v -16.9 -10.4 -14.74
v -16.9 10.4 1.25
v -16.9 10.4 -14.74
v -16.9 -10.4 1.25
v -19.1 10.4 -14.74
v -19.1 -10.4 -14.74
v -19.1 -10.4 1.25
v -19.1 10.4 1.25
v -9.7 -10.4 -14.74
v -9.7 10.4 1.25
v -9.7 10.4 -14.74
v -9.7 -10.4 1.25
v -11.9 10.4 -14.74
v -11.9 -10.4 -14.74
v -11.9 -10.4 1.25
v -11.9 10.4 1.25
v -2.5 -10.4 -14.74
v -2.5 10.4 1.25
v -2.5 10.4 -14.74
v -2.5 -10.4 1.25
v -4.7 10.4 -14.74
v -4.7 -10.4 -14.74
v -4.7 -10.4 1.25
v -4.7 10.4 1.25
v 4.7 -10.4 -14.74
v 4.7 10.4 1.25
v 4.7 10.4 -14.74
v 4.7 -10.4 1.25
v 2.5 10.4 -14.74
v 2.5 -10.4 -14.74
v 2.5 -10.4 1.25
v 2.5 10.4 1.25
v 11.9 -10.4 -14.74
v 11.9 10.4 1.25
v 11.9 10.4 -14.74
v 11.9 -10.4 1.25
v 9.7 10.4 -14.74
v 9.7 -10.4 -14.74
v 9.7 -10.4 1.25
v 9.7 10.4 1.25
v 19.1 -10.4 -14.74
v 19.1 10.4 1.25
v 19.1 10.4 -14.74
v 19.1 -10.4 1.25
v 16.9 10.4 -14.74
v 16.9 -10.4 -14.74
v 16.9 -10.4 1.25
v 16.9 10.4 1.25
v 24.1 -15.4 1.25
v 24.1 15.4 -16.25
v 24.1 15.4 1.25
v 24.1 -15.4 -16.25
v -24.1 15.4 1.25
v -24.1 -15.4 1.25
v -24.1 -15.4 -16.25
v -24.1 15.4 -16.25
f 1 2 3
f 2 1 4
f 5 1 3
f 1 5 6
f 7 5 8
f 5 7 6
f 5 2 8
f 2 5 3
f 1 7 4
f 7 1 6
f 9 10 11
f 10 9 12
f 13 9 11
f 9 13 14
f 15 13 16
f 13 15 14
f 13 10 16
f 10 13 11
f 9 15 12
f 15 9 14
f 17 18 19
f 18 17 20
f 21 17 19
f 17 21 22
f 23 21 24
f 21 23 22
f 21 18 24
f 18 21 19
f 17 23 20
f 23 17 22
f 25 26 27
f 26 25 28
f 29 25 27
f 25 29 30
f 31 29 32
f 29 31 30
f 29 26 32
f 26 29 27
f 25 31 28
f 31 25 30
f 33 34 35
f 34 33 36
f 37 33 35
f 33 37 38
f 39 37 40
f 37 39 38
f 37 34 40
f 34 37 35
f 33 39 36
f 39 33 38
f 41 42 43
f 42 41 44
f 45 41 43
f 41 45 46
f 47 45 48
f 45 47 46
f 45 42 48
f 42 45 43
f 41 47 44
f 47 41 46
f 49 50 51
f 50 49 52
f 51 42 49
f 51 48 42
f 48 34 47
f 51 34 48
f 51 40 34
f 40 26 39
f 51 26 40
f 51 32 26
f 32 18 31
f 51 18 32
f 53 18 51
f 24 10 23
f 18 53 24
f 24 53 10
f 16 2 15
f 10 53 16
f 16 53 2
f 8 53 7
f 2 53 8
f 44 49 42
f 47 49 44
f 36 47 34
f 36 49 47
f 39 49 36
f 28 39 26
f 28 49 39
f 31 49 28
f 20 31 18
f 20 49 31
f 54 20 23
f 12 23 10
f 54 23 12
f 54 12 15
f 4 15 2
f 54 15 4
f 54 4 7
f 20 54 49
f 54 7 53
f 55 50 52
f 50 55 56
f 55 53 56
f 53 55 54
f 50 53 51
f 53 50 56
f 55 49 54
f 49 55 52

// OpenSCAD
/**
 * memorystick-holder.scad
 * A Sony Memory Stick holder.
 *
 * @author Nathan Campos <nathan@innoveworkshop.com>
 */

// Generation parameters.
nslots  = 6;
spacing = 5;

// Memory Stick dimensions.
ms_width = 3.2;
ms_depth = 22.2;
ms_height = 50;

// Memory Stick Pro Duo dimensions.
mspd_width = 2.2;
mspd_depth = 20.8;
mspd_height = 31;

// Spacings dimensions.
floorh = 1.5;
expo_top = 15;

// Ensure a high-end render.
$fs = $preview ? 2 : 0.1;

/**
 * A single Sony Memory Stick cutout.
 *
 * @param type Type of Memory Stick ("ms" or "produo").
 */
module memorystick(type) {
	if (type == "ms") {
		color("lightpink")
		cube([ms_width, ms_depth, ms_height], center = true);
	}
	
	if (type == "produo") {
		color("lightpink")
		cube([mspd_width, mspd_depth, mspd_height], center = true);
	}
}

/**
 * Builds up a Memory Stick slot array.
 *
 * @param type  Type of Memory Stick ("ms" or "produo").
 * @param slots Number of slots.
 */
module slot_array(type, slots) {
	// Regular
	if (type == "ms") {
		width = ms_width;
		
		// Span the slots.
		translate([-((spacing + width) * (slots - 1)) / 2, 0, 0])
		for (i = [0 : (slots - 1)]) {
			translate([((width / 2) + (spacing + (width / 2))) * i, 0, 0])
				memorystick(type);
		}
	}
	
	// Pro Duo
	if (type == "produo") {
		width = mspd_width;

		// Span the slots.
		translate([-((spacing + width) * (slots - 1)) / 2, 0, 0])
		for (i = [0 : (slots - 1)]) {
			translate([((width / 2) + (spacing + (width / 2))) * i, 0, 0])
				memorystick(type);
		}
	}
}

/**
 * Builds up te Memory Stick case.
 *
 * @param type  Type of Memory Stick ("ms" or "produo").
 * @param slots Number of slots.
 */
module ms_case(type, slots = nslots) {
	// Regular
	if (type == "ms") {
		width = ms_width;
		depth = ms_depth;
		height = ms_height;
		
		difference() {
			// Case
			translate([0, 0, -expo_top / 2])
				cube([
					((spacing + width) * nslots) + spacing,
					(spacing * 2) + depth,
					height + floorh - expo_top
				], center = true);

			// Slots
			translate([0, 0, (floorh / 2) + 0.01])
				slot_array(type, slots);
		}
	}
	
	// Correct if needed for Pro Duo cards.
	if (type == "produo") {
		width = mspd_width;
		depth = mspd_depth;
		height = mspd_height;
		
		difference() {
			// Case
			translate([0, 0, -expo_top / 2])
				cube([
					((spacing + width) * nslots) + spacing,
					(spacing * 2) + depth,
					height + floorh - expo_top
				], center = true);

			// Slots
			translate([0, 0, (floorh / 2) + 0.01])
				slot_array(type, slots);
		}
	}
}

// Build a case.
ms_case("produo");
